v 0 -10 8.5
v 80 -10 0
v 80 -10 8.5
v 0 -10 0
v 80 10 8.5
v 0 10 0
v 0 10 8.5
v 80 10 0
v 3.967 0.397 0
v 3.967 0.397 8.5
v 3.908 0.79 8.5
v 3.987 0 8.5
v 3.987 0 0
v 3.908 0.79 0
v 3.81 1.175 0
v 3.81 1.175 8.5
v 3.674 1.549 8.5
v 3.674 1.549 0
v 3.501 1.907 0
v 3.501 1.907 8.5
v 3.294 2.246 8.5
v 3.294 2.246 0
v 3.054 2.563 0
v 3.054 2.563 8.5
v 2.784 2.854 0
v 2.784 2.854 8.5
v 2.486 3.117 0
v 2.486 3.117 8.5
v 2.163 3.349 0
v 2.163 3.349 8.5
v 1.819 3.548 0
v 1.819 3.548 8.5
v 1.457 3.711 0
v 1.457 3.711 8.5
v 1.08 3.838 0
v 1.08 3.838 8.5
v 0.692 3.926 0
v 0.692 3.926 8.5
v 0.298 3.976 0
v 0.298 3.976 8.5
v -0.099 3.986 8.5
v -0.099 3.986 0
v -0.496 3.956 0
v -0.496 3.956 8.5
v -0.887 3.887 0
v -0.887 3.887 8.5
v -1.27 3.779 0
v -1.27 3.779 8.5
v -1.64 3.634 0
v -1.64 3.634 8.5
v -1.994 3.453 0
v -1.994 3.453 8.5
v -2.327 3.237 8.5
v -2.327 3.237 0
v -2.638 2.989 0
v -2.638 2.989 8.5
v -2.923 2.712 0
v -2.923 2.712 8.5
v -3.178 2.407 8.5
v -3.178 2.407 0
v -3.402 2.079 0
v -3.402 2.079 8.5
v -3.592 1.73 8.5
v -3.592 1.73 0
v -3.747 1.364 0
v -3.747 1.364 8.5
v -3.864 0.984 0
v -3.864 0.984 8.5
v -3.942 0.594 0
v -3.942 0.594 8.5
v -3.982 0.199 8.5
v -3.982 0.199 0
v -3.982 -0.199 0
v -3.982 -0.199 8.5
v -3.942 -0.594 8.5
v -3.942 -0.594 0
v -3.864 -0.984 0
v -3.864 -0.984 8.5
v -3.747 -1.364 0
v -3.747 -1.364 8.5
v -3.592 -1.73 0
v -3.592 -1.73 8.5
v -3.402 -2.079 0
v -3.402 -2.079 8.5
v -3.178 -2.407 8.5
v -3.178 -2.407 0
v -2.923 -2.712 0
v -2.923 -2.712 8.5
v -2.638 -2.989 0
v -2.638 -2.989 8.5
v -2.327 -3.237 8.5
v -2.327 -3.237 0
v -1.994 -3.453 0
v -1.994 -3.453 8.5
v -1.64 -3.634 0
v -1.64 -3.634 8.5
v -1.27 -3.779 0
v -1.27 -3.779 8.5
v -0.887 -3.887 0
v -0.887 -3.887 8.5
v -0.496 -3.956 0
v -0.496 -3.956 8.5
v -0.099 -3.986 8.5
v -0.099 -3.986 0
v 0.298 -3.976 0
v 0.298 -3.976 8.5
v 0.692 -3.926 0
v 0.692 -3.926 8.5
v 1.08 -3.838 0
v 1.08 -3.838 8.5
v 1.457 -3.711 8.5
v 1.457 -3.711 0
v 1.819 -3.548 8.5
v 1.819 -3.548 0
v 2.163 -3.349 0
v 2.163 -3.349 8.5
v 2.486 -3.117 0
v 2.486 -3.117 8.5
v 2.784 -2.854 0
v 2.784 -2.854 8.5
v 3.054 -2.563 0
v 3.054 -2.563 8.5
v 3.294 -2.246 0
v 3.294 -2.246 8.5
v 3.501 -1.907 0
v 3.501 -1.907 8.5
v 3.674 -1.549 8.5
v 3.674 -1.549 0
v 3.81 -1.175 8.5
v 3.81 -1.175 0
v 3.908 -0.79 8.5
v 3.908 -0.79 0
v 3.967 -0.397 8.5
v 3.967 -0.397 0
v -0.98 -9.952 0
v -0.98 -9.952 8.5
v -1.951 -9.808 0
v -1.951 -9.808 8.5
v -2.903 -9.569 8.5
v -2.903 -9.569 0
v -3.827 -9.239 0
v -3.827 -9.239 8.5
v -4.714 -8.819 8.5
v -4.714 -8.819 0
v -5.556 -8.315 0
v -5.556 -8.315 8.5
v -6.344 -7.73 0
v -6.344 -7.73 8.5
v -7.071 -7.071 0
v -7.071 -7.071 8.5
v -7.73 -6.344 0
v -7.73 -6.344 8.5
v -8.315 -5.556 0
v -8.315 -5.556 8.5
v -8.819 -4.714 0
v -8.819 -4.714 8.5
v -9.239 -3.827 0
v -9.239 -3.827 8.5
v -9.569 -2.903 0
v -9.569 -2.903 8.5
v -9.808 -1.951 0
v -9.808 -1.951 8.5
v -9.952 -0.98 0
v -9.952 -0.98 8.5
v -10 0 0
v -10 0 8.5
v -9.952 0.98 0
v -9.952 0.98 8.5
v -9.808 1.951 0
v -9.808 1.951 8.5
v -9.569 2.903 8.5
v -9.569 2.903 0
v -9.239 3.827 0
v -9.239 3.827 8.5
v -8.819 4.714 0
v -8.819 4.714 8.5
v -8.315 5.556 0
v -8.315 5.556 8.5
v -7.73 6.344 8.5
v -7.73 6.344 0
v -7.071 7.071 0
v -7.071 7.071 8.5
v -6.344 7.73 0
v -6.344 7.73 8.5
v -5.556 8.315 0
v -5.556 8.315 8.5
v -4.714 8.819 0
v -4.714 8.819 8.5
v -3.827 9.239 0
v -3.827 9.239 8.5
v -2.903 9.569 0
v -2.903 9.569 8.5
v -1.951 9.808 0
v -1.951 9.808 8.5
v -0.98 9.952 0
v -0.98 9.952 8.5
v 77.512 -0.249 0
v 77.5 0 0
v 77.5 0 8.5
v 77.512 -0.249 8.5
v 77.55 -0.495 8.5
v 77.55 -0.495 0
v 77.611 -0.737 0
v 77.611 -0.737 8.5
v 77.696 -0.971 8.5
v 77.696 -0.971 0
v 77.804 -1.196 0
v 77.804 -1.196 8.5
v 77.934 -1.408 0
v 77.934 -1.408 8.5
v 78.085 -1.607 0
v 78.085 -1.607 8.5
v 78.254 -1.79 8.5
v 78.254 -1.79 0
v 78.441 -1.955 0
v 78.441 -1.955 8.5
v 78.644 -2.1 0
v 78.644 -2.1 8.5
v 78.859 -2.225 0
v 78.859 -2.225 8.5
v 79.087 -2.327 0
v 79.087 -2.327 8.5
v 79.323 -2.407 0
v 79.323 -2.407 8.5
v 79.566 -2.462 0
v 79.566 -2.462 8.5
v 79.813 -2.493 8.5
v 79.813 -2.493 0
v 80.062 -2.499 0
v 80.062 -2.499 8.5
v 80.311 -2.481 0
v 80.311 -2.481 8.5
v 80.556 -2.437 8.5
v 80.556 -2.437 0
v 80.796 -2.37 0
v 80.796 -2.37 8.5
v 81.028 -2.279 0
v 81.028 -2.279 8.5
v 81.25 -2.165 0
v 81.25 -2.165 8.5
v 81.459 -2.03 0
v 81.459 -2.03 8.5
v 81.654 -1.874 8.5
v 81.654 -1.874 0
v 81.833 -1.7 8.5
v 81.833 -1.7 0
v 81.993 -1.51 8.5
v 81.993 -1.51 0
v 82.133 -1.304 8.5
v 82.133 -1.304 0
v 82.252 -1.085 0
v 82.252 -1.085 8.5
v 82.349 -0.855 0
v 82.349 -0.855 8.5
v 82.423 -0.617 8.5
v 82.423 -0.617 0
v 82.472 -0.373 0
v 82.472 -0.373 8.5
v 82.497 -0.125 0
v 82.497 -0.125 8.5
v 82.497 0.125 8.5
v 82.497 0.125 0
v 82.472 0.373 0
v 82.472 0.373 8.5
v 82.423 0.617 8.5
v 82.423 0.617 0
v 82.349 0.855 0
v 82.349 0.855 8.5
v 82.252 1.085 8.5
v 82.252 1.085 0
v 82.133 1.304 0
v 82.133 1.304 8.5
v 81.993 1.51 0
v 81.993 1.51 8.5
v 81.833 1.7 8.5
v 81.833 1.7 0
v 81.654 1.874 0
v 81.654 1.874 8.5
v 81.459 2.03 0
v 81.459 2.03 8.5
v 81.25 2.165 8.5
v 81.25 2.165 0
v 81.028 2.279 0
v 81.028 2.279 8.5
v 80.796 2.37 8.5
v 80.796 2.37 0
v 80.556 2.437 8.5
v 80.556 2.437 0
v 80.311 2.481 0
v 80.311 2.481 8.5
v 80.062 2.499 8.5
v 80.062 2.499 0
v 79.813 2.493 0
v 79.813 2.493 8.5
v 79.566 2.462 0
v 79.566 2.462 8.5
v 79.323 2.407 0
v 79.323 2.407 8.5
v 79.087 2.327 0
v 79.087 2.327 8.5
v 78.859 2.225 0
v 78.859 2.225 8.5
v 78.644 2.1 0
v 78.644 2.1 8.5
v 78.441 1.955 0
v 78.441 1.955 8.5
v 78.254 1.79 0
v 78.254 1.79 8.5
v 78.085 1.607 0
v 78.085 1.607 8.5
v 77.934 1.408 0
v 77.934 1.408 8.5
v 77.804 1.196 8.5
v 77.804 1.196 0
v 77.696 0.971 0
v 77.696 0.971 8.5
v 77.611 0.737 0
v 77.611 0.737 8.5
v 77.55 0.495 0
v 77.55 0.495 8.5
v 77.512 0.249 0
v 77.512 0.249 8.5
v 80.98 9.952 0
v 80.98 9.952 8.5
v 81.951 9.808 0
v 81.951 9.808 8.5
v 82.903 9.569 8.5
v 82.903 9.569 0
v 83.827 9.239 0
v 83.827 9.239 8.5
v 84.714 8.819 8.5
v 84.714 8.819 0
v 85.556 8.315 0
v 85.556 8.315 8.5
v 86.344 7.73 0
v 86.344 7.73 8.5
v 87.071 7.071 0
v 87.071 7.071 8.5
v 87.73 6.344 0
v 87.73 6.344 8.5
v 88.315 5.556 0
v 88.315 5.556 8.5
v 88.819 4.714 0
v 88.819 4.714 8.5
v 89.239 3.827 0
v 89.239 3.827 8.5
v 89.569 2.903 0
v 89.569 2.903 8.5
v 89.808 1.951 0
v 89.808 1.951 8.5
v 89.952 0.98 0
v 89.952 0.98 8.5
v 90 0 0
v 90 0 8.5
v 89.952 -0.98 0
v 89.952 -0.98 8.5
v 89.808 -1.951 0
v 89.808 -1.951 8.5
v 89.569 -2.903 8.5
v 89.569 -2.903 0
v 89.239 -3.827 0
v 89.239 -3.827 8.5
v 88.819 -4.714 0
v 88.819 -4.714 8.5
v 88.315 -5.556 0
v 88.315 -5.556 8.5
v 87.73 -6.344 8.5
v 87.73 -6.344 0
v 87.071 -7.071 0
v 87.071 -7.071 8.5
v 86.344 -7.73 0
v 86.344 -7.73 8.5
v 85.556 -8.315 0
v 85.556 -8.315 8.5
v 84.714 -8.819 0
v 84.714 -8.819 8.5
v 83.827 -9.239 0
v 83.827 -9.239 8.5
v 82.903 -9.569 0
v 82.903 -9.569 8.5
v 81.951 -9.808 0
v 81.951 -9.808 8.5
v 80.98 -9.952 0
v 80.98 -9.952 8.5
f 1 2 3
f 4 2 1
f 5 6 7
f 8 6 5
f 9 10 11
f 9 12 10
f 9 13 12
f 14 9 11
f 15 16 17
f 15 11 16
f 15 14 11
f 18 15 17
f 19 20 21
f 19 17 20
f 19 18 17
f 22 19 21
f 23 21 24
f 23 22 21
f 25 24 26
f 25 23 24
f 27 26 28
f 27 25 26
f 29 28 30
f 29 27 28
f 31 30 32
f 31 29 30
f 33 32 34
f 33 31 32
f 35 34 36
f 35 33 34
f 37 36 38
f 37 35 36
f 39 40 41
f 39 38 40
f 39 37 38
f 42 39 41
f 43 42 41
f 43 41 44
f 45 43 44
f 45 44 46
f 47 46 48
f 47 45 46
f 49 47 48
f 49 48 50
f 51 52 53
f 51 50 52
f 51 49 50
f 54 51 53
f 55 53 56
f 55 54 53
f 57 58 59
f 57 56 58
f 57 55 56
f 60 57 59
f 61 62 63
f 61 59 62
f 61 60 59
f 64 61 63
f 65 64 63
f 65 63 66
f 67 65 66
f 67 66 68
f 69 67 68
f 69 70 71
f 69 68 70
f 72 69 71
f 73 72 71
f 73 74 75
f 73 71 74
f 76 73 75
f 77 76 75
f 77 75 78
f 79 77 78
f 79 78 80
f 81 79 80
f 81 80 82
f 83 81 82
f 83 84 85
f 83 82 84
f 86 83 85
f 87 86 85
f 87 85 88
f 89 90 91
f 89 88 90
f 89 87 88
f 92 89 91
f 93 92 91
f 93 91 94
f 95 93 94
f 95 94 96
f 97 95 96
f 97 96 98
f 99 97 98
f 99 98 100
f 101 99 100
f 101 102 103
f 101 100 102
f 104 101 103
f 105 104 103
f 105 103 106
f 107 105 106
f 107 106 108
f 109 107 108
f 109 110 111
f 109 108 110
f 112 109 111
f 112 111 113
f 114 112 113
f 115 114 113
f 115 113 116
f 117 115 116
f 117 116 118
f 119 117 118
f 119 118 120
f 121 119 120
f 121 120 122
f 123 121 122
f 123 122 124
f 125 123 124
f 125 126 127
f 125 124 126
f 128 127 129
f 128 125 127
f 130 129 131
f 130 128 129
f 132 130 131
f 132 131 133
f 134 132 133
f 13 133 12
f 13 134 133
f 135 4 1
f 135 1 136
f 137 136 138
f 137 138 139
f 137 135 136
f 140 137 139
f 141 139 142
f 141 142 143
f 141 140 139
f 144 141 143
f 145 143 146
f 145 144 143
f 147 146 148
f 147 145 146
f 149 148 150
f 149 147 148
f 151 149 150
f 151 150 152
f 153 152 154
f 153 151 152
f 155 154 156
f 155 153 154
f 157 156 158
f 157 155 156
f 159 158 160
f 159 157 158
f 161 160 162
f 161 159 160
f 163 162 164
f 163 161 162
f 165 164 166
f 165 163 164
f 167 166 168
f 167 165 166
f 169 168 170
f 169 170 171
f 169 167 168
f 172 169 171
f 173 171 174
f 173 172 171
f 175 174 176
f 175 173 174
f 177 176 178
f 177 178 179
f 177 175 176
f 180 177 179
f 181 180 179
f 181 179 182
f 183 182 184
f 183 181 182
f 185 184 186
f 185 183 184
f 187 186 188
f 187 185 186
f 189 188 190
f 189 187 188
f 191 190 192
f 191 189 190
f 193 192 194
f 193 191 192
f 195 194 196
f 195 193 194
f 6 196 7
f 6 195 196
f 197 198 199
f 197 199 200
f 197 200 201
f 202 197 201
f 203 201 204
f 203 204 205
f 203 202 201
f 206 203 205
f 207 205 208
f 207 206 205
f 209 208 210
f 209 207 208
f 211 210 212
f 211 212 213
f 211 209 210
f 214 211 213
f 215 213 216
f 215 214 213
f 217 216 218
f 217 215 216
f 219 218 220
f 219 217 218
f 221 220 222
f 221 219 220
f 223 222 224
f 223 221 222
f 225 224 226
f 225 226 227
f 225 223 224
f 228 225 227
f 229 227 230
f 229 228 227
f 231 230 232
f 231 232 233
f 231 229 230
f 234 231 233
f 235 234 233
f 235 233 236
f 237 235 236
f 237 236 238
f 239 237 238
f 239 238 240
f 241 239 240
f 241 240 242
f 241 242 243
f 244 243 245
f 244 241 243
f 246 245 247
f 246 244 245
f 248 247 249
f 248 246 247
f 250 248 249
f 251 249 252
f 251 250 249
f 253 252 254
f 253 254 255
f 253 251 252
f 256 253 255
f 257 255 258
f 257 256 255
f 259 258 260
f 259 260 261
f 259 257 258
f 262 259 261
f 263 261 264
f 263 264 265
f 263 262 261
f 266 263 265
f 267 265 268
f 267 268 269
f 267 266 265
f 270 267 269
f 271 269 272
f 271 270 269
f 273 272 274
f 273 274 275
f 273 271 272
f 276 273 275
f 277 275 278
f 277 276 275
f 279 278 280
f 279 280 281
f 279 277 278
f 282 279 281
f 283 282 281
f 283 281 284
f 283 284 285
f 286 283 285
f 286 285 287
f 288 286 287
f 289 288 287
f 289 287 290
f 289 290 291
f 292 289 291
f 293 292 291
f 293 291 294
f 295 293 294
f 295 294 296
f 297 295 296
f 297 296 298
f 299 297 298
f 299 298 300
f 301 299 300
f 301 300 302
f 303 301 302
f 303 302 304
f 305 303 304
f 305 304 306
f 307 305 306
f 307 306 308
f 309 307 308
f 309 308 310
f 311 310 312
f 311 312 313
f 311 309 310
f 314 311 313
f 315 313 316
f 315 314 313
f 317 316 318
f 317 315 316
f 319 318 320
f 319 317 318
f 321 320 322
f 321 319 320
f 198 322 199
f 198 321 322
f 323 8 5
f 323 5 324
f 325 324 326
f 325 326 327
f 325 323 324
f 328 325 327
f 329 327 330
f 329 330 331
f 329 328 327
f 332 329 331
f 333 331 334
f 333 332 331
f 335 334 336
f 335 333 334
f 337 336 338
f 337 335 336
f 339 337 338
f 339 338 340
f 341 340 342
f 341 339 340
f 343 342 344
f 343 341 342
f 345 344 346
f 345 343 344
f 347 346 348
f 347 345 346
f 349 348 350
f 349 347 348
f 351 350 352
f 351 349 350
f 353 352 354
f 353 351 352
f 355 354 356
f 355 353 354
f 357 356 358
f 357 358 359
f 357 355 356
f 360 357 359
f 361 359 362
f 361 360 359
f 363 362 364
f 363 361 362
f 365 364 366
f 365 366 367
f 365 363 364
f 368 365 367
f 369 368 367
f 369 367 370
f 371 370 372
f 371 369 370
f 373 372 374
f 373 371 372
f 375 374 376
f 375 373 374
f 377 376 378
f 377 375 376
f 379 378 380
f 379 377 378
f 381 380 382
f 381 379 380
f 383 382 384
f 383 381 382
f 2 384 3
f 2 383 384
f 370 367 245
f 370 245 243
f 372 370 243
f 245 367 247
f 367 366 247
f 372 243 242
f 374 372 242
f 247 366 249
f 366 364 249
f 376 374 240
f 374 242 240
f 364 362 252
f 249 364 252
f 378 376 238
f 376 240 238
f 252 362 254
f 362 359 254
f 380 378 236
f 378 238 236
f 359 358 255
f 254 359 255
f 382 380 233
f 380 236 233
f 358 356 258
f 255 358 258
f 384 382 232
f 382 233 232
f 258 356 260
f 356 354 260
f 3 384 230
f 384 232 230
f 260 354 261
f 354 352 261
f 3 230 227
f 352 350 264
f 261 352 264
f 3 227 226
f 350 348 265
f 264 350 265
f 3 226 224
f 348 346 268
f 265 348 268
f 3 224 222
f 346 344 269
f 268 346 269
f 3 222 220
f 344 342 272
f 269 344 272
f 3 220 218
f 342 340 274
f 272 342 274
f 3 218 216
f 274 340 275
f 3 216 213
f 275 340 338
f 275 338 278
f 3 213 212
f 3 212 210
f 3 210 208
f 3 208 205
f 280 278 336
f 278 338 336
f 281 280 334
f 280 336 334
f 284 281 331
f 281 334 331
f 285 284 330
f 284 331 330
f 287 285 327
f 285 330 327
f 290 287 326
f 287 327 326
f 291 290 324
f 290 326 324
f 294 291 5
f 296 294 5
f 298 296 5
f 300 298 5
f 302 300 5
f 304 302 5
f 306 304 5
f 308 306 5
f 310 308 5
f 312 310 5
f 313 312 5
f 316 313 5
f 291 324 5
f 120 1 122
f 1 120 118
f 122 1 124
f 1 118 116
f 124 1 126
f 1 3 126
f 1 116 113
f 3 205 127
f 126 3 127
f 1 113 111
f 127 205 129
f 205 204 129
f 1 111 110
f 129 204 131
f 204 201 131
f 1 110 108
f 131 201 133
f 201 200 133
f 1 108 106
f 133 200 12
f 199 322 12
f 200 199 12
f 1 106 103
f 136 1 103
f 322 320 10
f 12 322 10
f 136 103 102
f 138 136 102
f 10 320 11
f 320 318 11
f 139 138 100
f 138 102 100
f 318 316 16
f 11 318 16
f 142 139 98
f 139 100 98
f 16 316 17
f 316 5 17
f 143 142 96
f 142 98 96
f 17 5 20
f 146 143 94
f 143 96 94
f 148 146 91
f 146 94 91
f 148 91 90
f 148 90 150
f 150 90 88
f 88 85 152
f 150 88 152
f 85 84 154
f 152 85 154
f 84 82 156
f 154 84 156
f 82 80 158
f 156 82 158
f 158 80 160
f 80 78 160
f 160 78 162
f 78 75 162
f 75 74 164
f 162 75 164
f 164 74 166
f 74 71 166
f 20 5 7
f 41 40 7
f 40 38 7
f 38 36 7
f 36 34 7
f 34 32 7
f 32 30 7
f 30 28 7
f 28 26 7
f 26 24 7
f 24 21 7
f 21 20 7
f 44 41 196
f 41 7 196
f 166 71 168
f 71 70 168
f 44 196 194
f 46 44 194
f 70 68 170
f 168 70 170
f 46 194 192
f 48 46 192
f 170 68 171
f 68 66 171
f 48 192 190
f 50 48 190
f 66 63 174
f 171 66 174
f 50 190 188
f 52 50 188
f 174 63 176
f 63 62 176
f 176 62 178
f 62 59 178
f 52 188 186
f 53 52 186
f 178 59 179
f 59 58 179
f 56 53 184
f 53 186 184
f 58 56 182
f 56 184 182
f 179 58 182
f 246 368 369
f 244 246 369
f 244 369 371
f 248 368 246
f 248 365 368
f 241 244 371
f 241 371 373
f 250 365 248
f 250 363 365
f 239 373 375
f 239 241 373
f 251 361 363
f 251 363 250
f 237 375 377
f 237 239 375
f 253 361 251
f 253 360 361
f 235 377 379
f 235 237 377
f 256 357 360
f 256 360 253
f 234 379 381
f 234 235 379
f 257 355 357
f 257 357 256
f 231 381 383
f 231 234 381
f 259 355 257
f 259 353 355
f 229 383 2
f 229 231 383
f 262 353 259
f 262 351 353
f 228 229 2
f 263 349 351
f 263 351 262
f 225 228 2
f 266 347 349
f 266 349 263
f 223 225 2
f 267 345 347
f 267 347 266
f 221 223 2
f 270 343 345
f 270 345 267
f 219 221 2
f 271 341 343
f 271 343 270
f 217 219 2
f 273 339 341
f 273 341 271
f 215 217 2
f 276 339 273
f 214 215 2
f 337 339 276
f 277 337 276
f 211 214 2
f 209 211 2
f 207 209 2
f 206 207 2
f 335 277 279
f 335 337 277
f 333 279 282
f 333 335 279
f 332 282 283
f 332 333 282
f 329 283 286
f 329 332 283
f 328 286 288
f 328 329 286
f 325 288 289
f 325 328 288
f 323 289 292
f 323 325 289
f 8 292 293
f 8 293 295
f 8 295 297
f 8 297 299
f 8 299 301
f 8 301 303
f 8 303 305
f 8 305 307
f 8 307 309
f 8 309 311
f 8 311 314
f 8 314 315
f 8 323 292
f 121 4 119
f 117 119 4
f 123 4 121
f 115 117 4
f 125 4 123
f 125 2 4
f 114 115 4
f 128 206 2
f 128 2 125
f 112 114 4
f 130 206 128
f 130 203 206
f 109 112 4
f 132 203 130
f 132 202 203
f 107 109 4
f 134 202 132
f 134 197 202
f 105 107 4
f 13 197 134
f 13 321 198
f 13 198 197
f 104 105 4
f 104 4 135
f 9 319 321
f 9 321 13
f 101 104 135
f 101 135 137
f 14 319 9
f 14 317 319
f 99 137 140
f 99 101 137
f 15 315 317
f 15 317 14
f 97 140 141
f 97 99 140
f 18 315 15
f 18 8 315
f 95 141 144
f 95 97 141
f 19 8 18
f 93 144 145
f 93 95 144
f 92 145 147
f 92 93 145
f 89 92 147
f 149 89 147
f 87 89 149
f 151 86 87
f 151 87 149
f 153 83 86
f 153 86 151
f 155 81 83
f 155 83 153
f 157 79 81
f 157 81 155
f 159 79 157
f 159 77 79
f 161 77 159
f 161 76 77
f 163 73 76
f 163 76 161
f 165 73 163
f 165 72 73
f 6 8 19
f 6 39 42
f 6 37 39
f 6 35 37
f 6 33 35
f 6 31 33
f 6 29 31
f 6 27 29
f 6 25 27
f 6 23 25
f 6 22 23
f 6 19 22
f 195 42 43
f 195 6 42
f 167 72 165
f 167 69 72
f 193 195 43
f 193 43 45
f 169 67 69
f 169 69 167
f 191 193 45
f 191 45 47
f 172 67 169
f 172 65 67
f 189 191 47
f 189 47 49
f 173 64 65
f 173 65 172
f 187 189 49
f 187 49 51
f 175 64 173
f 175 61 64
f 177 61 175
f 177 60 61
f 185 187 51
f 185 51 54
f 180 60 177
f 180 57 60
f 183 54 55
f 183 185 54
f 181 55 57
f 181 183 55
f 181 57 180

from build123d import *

# Parameters (mm, degrees)
SKETCH_1_R               = 2.5
EXTRUDE_1_DEPTH          = 8.5
CUT_EXTRUDE_2_DEPTH      = 91.95191037
CUT_EXTRUDE_2_DEPTH_BACK = 91.95191037
SKETCH_2_R               = 3.98703102


with BuildPart() as part:
    # 草图1 → 凸台-拉伸1 (new body)
    with BuildSketch(Plane.XY):
        with BuildLine():
            Line((0, 10), (80, 10))
            ThreePointArc((80, 10), (90, 0), (80, -10))
            Line((80, -10), (0, -10))
            ThreePointArc((0, -10), (-10, 0), (0, 10))
        make_face()
        Circle(SKETCH_1_R, mode=Mode.SUBTRACT)
        with Locations(Location((80, 0, 0), (0, 0, 180))):
            Circle(SKETCH_1_R, mode=Mode.SUBTRACT)
    extrude(amount=EXTRUDE_1_DEPTH)

    # 草图2 → 切除-拉伸2 (cut, two sides: drawn at the far end of the back side and taken through both)
    with BuildSketch(Plane.XY.offset(8.5).offset(-CUT_EXTRUDE_2_DEPTH_BACK)):
        Circle(SKETCH_2_R)
    extrude(amount=CUT_EXTRUDE_2_DEPTH + CUT_EXTRUDE_2_DEPTH_BACK, mode=Mode.SUBTRACT)


solid = part.part
